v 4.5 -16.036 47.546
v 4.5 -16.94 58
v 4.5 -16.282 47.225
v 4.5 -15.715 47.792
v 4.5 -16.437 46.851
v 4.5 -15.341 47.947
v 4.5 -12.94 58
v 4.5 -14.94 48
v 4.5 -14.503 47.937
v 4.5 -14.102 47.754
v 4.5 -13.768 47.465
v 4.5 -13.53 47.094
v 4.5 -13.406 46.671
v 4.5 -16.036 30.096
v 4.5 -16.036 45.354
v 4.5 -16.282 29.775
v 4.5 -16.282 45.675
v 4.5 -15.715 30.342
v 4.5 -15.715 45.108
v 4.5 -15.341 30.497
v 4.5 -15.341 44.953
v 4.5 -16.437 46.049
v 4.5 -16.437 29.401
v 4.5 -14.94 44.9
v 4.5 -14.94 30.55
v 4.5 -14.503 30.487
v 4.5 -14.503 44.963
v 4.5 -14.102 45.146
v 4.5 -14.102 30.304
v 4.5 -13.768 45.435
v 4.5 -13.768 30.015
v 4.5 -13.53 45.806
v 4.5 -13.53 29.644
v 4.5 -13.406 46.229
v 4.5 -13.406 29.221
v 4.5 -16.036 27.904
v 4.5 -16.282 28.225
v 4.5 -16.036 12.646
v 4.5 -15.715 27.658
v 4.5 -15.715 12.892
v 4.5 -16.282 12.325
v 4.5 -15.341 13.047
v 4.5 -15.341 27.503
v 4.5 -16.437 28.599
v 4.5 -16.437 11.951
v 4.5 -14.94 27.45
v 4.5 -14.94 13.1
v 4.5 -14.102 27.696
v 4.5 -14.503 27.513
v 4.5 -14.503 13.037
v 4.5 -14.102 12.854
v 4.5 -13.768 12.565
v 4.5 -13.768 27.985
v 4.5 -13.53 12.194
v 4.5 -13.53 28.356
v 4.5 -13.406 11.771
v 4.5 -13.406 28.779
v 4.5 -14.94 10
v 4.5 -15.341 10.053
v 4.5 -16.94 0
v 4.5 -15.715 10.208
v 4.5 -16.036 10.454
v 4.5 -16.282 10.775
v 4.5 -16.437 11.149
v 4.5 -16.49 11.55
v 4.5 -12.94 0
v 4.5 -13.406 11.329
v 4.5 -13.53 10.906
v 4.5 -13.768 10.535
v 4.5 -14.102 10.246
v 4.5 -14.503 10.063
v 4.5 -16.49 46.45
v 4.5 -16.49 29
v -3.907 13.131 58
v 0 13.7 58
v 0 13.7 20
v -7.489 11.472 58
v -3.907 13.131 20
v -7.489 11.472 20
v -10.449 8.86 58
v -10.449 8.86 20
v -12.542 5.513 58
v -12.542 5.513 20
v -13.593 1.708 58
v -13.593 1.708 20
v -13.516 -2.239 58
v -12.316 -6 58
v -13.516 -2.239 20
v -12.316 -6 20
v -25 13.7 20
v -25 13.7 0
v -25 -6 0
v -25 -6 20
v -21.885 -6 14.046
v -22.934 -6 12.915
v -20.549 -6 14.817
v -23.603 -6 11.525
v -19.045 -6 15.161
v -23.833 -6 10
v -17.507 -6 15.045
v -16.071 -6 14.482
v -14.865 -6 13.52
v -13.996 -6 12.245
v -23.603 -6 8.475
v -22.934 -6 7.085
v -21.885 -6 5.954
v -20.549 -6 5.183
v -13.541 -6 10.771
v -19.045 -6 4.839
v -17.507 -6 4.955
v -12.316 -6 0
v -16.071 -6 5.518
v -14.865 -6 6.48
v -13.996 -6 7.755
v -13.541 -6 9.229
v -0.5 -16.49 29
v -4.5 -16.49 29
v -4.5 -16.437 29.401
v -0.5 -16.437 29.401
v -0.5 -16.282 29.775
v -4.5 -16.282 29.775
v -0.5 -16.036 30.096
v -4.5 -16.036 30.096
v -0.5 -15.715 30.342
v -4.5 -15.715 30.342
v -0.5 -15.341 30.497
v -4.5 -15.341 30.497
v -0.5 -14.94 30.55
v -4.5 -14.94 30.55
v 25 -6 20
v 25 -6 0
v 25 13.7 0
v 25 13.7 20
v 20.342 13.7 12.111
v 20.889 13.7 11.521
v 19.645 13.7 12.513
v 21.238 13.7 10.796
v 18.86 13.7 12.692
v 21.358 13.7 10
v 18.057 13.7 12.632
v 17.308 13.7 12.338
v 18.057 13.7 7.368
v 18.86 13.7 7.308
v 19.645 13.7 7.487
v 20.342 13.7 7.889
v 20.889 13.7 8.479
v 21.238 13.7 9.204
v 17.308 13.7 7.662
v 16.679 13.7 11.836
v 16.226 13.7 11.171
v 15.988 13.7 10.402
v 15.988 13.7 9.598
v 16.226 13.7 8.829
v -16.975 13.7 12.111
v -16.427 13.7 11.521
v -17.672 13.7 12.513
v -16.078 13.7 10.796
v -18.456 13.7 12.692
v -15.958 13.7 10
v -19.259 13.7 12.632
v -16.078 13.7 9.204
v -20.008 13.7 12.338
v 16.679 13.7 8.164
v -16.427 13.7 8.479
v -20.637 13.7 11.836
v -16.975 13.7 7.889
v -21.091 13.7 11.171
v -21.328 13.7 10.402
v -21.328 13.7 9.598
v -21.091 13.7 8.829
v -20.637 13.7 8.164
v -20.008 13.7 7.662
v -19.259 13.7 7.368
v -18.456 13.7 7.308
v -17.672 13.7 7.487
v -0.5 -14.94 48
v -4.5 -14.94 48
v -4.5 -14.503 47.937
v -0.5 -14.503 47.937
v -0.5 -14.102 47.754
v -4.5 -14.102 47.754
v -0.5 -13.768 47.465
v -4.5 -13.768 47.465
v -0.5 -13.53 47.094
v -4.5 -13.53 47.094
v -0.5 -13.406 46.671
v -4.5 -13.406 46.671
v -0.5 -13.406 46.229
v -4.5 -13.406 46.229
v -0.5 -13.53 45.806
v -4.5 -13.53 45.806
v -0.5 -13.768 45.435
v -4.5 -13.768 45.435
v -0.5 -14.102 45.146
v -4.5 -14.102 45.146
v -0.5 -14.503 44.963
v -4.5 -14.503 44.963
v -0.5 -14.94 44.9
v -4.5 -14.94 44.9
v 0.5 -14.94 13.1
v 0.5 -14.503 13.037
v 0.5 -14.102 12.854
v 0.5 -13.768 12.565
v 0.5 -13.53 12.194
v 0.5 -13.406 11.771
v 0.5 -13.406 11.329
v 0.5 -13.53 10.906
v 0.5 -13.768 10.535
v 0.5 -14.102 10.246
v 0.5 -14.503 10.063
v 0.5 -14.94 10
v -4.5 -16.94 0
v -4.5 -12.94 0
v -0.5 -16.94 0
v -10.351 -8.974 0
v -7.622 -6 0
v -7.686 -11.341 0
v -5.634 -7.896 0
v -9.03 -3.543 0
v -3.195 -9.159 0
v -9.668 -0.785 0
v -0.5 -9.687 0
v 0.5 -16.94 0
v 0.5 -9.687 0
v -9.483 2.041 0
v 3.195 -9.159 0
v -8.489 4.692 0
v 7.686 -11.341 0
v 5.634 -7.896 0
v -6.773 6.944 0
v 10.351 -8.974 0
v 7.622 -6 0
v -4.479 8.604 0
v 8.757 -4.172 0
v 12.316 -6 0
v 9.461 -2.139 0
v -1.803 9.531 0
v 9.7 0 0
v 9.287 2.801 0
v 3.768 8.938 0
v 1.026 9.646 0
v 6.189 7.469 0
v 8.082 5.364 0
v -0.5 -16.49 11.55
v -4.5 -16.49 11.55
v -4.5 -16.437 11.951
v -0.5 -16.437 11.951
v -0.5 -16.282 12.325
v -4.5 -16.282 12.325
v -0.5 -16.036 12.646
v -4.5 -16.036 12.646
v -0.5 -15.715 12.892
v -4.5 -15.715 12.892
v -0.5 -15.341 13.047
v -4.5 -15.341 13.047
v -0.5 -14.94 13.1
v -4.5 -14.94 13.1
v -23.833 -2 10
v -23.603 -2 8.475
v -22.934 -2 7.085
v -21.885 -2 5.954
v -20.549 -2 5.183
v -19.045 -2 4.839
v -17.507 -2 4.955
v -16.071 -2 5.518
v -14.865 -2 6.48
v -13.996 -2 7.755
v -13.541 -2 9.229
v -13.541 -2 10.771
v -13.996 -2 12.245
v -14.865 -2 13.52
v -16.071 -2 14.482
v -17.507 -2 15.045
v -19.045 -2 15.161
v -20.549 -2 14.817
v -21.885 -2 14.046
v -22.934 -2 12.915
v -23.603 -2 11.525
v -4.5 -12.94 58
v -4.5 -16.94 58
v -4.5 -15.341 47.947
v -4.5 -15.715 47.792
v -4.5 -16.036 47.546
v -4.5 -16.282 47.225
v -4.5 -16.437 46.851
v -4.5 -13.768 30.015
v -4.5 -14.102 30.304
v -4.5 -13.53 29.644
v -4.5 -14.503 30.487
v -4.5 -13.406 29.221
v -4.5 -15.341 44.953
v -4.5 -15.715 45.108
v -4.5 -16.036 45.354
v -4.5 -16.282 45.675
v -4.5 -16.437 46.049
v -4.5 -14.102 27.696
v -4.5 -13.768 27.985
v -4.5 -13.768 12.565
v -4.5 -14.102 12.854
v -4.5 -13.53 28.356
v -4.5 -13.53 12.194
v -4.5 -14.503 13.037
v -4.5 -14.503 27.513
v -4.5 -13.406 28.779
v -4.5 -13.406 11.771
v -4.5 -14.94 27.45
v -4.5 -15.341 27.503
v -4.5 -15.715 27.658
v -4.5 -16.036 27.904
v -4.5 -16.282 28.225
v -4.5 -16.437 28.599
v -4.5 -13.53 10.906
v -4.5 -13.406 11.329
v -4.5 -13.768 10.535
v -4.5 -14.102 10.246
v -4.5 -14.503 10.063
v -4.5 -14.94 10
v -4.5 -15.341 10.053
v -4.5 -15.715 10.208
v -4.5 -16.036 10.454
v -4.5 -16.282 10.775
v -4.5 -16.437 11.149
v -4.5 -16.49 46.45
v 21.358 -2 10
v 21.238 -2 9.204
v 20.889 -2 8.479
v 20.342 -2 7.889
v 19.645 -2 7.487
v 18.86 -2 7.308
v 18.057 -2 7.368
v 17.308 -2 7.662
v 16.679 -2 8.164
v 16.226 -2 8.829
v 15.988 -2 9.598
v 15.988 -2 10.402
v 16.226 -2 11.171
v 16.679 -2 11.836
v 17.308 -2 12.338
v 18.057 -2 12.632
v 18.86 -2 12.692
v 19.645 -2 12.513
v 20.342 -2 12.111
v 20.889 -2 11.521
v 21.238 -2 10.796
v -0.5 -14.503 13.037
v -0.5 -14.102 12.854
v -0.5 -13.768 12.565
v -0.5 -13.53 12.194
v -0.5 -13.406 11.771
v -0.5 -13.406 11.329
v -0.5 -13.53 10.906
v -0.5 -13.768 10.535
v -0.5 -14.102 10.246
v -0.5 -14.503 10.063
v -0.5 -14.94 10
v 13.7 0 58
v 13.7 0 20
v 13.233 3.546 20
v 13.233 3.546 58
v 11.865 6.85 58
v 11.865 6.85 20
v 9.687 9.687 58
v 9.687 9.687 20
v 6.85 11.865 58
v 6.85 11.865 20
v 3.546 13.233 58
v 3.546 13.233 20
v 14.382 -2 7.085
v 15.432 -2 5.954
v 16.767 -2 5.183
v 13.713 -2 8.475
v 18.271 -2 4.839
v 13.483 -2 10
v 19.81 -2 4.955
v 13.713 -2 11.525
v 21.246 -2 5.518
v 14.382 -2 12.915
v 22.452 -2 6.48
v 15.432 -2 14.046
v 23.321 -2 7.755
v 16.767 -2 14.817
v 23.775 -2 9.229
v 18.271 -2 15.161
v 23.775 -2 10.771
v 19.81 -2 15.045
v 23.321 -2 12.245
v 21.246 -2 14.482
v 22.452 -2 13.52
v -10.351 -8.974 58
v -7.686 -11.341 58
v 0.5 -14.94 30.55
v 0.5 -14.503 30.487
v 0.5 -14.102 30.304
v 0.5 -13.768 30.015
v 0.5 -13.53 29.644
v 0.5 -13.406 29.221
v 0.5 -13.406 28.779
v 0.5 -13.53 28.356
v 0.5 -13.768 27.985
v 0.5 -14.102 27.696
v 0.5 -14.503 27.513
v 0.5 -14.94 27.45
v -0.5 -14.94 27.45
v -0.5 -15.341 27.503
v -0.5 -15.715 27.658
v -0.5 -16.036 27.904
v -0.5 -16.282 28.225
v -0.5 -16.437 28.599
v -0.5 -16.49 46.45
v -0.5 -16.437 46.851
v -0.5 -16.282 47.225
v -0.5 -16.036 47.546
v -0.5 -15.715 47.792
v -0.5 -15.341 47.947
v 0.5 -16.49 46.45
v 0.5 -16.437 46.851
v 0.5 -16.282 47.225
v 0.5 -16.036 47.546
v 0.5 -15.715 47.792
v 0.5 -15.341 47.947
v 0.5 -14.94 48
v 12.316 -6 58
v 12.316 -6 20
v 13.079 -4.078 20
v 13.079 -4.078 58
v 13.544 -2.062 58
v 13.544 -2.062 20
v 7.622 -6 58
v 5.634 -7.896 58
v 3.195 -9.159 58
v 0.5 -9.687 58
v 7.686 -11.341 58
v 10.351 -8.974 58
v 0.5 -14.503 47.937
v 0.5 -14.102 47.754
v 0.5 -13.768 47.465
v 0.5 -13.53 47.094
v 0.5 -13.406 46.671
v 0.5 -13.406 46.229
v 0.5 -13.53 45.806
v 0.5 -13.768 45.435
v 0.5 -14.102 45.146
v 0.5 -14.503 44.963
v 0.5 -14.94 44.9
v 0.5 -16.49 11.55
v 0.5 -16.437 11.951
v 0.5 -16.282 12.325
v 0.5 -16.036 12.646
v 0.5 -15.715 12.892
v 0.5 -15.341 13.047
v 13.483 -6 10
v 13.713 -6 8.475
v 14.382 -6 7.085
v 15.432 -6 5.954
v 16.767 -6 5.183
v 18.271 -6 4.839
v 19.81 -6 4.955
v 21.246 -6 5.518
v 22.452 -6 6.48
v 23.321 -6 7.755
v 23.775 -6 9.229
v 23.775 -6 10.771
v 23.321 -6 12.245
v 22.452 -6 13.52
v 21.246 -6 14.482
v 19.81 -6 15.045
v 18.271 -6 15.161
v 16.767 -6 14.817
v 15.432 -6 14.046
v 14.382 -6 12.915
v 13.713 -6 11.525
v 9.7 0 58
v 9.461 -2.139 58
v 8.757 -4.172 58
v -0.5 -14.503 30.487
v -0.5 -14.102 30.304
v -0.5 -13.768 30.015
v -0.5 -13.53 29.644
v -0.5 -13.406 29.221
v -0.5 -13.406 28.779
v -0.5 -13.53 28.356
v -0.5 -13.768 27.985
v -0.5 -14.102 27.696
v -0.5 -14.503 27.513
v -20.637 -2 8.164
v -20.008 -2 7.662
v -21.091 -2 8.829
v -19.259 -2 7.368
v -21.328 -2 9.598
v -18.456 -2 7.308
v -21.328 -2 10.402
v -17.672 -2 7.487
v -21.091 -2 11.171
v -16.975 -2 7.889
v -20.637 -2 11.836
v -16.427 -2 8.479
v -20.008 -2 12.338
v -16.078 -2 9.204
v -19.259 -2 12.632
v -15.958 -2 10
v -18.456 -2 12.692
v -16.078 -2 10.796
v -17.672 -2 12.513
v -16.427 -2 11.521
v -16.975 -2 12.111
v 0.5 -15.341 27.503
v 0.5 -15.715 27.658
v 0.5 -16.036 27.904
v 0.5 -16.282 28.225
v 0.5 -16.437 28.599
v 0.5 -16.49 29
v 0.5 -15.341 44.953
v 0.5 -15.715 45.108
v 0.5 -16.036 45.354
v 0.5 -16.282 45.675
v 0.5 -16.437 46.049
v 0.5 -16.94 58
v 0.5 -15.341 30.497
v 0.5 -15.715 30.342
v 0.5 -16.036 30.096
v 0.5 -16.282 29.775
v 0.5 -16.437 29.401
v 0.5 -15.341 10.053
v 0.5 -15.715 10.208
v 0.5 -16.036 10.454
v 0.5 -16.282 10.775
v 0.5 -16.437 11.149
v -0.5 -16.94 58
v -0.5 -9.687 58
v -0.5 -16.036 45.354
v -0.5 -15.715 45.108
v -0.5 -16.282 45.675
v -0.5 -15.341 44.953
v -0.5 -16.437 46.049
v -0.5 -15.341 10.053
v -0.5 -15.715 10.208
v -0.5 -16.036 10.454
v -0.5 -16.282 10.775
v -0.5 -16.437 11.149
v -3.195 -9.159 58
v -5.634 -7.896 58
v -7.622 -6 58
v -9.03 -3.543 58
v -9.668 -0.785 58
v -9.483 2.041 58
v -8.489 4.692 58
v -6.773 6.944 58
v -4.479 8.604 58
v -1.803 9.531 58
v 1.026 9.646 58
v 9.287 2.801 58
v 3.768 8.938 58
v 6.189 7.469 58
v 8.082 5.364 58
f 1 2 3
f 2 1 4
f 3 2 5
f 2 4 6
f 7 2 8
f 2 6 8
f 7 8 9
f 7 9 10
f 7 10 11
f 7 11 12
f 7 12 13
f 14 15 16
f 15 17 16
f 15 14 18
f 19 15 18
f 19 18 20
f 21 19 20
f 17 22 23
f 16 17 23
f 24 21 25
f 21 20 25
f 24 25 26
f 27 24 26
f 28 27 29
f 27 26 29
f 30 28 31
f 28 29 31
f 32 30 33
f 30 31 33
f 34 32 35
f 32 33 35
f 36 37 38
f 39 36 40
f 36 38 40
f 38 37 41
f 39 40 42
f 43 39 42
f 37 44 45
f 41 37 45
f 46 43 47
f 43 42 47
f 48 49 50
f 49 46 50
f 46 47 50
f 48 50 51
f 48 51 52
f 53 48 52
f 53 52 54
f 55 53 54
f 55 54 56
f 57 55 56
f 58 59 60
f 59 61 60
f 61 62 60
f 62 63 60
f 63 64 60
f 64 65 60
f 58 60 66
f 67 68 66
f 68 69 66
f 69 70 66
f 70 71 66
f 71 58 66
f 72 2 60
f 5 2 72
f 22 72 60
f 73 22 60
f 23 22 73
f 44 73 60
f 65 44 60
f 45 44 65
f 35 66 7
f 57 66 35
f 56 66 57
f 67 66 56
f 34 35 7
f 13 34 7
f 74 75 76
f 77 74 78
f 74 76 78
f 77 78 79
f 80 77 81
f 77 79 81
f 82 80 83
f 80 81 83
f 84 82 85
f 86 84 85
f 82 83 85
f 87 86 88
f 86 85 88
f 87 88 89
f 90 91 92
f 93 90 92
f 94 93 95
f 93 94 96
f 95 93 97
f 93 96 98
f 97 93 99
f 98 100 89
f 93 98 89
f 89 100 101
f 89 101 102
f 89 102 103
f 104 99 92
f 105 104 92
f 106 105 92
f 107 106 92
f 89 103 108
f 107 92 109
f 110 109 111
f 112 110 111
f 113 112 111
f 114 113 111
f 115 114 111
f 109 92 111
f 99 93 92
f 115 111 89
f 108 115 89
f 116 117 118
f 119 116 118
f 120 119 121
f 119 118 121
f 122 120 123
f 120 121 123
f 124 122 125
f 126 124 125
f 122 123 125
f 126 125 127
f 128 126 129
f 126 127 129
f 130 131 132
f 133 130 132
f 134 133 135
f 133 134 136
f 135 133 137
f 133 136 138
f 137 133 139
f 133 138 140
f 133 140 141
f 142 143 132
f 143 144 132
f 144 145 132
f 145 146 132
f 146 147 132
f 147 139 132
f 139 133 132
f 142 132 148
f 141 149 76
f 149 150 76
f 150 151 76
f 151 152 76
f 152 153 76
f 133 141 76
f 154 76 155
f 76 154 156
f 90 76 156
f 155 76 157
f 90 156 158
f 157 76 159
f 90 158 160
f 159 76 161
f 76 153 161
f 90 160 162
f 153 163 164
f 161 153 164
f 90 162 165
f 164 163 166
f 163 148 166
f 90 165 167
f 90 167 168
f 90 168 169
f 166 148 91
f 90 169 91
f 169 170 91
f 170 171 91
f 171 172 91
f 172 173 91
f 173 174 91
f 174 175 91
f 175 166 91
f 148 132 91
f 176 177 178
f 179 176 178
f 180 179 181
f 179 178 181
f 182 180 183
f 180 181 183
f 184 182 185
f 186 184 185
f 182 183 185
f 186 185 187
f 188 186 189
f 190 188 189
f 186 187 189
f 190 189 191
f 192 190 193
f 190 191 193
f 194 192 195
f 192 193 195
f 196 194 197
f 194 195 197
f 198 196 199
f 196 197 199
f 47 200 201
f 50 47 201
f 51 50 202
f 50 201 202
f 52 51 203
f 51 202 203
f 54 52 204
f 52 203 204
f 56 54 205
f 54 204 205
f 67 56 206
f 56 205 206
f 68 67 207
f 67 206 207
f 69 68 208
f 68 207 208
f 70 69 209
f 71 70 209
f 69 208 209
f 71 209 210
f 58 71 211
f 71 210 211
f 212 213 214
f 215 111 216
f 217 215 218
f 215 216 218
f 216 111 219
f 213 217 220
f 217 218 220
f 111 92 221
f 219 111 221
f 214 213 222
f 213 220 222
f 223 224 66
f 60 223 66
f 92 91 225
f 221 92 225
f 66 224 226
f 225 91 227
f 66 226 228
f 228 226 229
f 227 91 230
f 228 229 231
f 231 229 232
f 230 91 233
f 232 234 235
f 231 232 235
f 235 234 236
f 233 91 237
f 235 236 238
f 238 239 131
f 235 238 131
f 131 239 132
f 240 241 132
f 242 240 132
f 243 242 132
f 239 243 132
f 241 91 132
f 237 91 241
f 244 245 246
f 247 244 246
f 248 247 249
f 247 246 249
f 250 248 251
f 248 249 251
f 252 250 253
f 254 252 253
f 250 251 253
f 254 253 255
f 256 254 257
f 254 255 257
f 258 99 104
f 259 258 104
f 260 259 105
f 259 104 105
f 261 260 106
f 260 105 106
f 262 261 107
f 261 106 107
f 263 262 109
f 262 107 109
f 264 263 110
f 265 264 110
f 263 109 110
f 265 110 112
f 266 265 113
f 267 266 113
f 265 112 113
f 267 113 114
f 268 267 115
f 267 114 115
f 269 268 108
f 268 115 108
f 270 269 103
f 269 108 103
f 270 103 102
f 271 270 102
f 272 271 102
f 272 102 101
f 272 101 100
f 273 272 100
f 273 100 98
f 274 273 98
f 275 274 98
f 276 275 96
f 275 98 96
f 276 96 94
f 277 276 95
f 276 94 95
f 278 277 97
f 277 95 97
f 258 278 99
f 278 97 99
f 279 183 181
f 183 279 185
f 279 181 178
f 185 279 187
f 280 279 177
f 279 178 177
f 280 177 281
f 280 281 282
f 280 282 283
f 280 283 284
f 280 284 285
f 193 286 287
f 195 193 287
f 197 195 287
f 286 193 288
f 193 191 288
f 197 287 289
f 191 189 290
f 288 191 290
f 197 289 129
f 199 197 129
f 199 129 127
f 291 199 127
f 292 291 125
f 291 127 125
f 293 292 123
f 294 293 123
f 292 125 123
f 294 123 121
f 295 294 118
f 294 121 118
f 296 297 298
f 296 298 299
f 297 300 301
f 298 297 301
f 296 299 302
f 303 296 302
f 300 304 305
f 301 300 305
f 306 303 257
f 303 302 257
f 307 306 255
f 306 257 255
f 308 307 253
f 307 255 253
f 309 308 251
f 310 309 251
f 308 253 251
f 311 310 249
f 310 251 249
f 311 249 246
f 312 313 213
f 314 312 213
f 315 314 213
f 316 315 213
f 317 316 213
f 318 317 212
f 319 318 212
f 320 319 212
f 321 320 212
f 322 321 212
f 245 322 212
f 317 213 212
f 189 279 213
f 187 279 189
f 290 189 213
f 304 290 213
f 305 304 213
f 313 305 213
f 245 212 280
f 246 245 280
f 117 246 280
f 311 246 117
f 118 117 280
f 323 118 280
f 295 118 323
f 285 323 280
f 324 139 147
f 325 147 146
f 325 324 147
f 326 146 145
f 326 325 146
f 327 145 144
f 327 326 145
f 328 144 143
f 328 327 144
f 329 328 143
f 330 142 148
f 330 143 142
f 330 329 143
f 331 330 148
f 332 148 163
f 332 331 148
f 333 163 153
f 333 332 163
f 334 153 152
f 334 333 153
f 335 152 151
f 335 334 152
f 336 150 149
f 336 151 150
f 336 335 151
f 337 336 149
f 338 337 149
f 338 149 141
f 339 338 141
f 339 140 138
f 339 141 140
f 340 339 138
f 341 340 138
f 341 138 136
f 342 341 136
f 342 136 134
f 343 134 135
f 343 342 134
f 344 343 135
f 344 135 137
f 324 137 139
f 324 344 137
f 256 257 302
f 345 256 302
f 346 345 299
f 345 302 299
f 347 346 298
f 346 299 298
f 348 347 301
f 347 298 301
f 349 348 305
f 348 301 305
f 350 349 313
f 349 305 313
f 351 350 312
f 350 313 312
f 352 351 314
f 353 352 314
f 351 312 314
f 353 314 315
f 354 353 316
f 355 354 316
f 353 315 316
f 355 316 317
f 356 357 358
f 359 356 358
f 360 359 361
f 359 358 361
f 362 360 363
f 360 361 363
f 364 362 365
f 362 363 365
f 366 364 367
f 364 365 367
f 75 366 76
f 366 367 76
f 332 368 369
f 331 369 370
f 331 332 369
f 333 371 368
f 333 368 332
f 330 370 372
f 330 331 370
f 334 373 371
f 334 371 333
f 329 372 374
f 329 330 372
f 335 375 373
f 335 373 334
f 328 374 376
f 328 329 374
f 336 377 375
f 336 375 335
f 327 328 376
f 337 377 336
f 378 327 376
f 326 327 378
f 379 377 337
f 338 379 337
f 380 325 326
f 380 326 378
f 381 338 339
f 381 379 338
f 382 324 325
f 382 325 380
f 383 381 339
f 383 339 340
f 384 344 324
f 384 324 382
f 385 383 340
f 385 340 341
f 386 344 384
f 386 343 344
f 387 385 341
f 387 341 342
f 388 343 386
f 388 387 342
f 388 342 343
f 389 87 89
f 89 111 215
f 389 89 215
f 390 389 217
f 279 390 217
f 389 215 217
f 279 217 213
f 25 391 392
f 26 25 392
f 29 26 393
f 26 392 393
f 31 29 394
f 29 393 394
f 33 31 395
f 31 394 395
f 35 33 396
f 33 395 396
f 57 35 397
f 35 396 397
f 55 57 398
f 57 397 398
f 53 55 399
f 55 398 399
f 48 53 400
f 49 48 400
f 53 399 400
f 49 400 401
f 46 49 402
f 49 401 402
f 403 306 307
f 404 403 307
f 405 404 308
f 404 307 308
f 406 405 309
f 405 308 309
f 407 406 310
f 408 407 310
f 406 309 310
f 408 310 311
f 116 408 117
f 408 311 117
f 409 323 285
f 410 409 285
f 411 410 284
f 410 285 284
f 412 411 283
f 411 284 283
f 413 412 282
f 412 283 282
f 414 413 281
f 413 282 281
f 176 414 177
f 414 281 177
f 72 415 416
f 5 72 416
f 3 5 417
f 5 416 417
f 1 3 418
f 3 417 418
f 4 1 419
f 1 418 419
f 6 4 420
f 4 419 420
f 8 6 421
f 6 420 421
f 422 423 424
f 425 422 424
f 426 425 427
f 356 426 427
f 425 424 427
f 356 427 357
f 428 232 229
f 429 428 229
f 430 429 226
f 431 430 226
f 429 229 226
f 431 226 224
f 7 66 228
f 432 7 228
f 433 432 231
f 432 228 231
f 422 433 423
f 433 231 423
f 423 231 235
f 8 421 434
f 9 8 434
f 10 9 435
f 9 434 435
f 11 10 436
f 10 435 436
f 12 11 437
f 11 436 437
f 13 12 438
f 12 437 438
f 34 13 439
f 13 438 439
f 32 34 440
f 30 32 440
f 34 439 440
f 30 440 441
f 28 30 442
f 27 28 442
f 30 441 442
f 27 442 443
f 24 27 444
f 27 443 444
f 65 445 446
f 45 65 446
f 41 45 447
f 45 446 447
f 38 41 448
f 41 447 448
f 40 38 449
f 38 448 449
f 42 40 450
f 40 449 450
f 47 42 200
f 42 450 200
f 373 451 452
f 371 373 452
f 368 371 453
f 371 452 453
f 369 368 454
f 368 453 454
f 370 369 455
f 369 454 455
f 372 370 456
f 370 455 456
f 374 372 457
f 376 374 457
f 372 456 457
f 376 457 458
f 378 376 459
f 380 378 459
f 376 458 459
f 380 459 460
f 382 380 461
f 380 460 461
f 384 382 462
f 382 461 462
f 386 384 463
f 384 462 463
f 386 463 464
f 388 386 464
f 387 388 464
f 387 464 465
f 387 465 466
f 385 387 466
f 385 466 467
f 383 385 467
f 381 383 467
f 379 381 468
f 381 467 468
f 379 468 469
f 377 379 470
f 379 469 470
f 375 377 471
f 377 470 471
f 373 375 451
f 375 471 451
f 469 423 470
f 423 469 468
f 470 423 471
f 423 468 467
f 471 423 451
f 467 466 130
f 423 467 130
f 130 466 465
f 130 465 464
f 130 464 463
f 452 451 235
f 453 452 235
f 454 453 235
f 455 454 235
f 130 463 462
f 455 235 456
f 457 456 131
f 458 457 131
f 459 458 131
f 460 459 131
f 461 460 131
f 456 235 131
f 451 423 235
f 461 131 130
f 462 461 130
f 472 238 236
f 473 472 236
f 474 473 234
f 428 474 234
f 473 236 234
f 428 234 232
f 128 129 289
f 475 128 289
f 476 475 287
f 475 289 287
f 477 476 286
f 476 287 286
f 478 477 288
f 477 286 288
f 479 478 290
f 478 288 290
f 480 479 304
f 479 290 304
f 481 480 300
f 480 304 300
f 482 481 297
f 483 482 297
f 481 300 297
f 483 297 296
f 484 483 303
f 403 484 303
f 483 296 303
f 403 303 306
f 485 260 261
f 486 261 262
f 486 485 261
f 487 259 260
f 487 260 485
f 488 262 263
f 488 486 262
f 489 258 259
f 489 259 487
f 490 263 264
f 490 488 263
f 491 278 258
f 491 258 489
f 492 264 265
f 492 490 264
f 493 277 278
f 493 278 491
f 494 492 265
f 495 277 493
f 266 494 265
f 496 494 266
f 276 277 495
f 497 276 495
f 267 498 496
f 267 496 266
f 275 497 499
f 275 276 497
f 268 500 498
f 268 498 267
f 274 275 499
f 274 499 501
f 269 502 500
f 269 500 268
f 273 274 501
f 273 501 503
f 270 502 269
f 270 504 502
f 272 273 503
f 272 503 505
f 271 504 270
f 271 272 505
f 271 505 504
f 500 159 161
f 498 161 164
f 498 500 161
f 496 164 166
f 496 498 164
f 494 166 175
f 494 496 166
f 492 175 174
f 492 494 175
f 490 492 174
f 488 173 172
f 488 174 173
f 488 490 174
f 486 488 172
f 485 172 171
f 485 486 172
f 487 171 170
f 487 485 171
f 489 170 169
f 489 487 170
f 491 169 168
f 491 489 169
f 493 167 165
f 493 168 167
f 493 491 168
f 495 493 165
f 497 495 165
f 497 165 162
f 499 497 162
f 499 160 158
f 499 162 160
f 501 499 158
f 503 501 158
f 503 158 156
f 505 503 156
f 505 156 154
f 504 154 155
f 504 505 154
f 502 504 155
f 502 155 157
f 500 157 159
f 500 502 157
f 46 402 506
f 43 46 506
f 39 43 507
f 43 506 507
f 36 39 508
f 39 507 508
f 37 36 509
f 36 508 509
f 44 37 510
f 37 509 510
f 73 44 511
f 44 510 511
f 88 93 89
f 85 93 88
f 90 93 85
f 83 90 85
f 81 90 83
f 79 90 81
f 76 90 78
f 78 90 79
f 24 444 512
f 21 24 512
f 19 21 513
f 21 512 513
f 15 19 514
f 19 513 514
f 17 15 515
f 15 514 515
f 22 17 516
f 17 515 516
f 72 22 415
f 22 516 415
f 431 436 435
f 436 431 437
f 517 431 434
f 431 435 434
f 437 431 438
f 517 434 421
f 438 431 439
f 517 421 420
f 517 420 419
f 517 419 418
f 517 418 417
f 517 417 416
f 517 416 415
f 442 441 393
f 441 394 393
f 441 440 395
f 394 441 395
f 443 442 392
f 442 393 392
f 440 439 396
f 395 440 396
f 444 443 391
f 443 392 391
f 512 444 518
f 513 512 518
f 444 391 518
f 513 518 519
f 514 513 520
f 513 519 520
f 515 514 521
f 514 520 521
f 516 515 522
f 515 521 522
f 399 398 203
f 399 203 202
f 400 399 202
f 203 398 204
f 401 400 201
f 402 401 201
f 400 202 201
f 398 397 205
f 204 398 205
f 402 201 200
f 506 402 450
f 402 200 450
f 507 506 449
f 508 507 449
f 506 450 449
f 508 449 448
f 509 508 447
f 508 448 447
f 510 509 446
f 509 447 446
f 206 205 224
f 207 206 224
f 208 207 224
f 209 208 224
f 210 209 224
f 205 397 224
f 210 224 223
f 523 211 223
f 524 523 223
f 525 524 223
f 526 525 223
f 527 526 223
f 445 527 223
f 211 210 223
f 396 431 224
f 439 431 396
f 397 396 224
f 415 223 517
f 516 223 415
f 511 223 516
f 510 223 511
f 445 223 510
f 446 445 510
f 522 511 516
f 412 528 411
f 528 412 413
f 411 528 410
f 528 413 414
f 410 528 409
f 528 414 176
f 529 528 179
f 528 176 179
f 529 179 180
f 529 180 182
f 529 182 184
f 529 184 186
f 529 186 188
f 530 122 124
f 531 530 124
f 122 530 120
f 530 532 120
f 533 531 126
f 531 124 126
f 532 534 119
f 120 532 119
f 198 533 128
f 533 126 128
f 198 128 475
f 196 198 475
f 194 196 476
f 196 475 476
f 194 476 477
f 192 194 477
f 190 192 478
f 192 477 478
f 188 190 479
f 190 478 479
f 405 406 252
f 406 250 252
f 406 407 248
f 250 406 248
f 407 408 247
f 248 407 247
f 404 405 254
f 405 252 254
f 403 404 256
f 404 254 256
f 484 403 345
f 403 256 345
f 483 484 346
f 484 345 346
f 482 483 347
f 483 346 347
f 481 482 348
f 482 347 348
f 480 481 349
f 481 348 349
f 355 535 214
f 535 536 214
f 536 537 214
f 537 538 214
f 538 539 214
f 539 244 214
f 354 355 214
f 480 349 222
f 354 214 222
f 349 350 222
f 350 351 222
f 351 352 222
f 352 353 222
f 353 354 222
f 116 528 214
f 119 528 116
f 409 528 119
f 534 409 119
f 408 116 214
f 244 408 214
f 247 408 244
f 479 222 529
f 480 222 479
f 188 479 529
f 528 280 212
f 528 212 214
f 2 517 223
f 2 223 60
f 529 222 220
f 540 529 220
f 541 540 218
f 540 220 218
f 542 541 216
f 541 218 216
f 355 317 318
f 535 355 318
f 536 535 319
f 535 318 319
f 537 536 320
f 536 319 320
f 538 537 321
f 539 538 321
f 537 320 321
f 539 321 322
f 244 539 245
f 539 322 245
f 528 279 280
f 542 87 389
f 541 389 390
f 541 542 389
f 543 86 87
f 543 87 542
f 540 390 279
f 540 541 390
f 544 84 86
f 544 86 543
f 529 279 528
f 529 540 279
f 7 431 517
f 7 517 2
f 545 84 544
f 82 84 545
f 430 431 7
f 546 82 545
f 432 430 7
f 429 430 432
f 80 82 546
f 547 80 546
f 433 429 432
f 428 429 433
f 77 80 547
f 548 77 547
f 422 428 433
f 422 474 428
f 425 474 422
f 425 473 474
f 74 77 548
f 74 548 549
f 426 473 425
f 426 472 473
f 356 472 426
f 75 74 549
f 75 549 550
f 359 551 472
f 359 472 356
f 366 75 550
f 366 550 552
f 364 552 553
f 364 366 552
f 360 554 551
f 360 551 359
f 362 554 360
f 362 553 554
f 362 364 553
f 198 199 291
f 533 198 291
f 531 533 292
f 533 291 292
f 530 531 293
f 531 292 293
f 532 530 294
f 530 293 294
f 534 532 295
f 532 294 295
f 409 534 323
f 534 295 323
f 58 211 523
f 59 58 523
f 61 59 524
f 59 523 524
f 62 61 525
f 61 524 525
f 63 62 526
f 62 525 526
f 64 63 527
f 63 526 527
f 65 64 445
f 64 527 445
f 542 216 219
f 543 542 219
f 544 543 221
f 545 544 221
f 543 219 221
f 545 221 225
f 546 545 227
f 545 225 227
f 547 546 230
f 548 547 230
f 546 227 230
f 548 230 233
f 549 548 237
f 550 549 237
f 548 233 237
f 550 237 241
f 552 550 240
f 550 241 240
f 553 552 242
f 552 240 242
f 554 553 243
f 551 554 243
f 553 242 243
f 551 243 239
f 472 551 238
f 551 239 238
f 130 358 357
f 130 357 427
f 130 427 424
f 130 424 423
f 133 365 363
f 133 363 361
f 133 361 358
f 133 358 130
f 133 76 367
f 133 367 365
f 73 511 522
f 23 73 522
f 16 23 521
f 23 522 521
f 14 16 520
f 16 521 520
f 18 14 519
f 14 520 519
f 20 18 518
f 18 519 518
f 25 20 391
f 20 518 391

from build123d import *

# Parameters (mm, degrees)
F1_DEPTH = 20
F0_W     = 4
F0_H     = 2.9398608957
F2_DEPTH = 58
F4_DEPTH = 4
F5_DEPTH = 20
F7_DEPTH = 9


# Not quite as in the source:
# - a feature names something its author has since deleted; it is built from what else it names


with BuildPart() as f1:
    # F0 (on Top) → F1 (new body)
    with BuildSketch(Plane.XY):
        with BuildLine():
            Line((0, 13.7), (-25, 13.7))
            Line((-25, 13.7), (-25, -6))
            Line((-25, -6), (-12.3162494291, -6))
            ThreePointArc((-12.3162494291, -6), (-11.6165829744, 7.2625753008), (0, 13.7))
        make_face()
    extrude(amount=F1_DEPTH)



with BuildPart() as f1b:
    # F0 (on Top) → F1, piece 2 (new body)
    with BuildSketch(Plane.XY):
        with BuildLine():
            Line((25, 13.7), (0, 13.7))
            ThreePointArc((0, 13.7), (9.6873629023, 9.6873629023), (13.7, 0))
            ThreePointArc((13.7, 0), (13.3495808395, -3.0787483513), (12.3162494291, -6))
            Line((12.3162494291, -6), (25, -6))
            Line((25, -6), (25, 13.7))
        make_face()
    extrude(amount=F1_DEPTH)


with BuildPart() as f1_1:
    add(f1.part)

    add(f1b.part)  # F2 merges F1b
    # F0 (on Top) → F2 (join)
    with BuildSketch(Plane.XY):
        with BuildLine():
            ThreePointArc((13.7, 0), (9.6873629023, 9.6873629023), (0, 13.7))
            ThreePointArc((0, 13.7), (-11.6165829744, 7.2625753008), (-12.3162494291, -6))
            Line((-12.3162494291, -6), (-7.6216796049, -6))
            ThreePointArc((-7.6216796049, -6), (-3.1748785672, 9.1657048875), (9.7, 0))
            ThreePointArc((9.7, 0), (9.1657048875, -3.1748785672), (7.6216796049, -6))
            Line((7.6216796049, -6), (12.3162494291, -6))
            ThreePointArc((12.3162494291, -6), (13.3495808395, -3.0787483513), (13.7, 0))
        make_face()
        with BuildLine():
            Line((-7.6216796049, -6), (-12.3162494291, -6))
            ThreePointArc((-12.3162494291, -6), (-9.0959869464, -10.244658192), (-4.5, -12.9398608957))
            ThreePointArc((-4.5, -12.9398608957), (-2.5280436601, -13.4647315329), (-0.5, -13.6908728721))
            Line((-0.5, -13.6908728721), (-0.5, -9.6871048306))
            ThreePointArc((-0.5, -9.6871048306), (-4.4597203286, -8.6139941137), (-7.6216796049, -6))
        make_face()
        with BuildLine():
            ThreePointArc((4.5, -12.9398608957), (9.0959869464, -10.244658192), (12.3162494291, -6))
            Line((12.3162494291, -6), (7.6216796049, -6))
            ThreePointArc((7.6216796049, -6), (4.4597203286, -8.6139941137), (0.5, -9.6871048306))
            Line((0.5, -9.6871048306), (0.5, -13.6908728721))
            ThreePointArc((0.5, -13.6908728721), (2.5280436601, -13.4647315329), (4.5, -12.9398608957))
        make_face()
        with Locations((2.5, -15.4699304478)):
            Rectangle(F0_W, F0_H)
        with BuildLine():
            Line((4.5, -14), (4.5, -12.9398608957))
            ThreePointArc((4.5, -12.9398608957), (2.5280436601, -13.4647315329), (0.5, -13.6908728721))
            Line((0.5, -13.6908728721), (0.5, -14))
            Line((0.5, -14), (4.5, -14))
        make_face()
        with BuildLine():
            ThreePointArc((-0.5, -13.6908728721), (-2.5280436601, -13.4647315329), (-4.5, -12.9398608957))
            Line((-4.5, -12.9398608957), (-4.5, -14))
            Line((-4.5, -14), (-0.5, -14))
            Line((-0.5, -14), (-0.5, -13.6908728721))
        make_face()
        with Locations((-2.5, -15.4699304478)):
            Rectangle(F0_W, F0_H)
    extrude(amount=F2_DEPTH)

    # F3 (on face) → F4 (cut)
    with BuildSketch(Plane.XZ.offset(6)):
        with BuildLine():
            ThreePointArc((-21.3581247146, 10), (-18.6581247146, 12.7), (-15.9581247146, 10))
            Line((-15.9581247146, 10), (-13.4831247146, 10))
            ThreePointArc((-13.4831247146, 10), (-18.6581247146, 15.175), (-23.8331247146, 10))
            Line((-23.8331247146, 10), (-21.3581247146, 10))
        make_face()
        with BuildLine():
            Line((-13.4831247146, 10), (-15.9581247146, 10))
            ThreePointArc((-15.9581247146, 10), (-18.6581247146, 7.3), (-21.3581247146, 10))
            Line((-21.3581247146, 10), (-23.8331247146, 10))
            ThreePointArc((-23.8331247146, 10), (-18.6581247146, 4.825), (-13.4831247146, 10))
        make_face()
        with BuildLine():
            ThreePointArc((23.8331247146, 10), (18.6581247146, 15.175), (13.4831247146, 10))
            Line((13.4831247146, 10), (15.9581247146, 10))
            ThreePointArc((15.9581247146, 10), (18.6581247146, 12.7), (21.3581247146, 10))
            Line((21.3581247146, 10), (23.8331247146, 10))
        make_face()
        with BuildLine():
            Line((15.9581247146, 10), (13.4831247146, 10))
            ThreePointArc((13.4831247146, 10), (18.6581247146, 4.825), (23.8331247146, 10))
            Line((23.8331247146, 10), (21.3581247146, 10))
            ThreePointArc((21.3581247146, 10), (18.6581247146, 7.3), (15.9581247146, 10))
        make_face()
    extrude(amount=-F4_DEPTH, mode=Mode.SUBTRACT)

    # F5 (cut): faces of the model
    f5_faces = [f1_1.faces().sort_by_distance(p)[0] for p in [
        (-18.6581247146, -6, 10),
        (18.6581247146, -6, 10),
    ]]
    extrude(f5_faces, amount=-F5_DEPTH, mode=Mode.SUBTRACT)

    # F6 (on face) → F7 (cut)
    with BuildSketch(Plane(origin=(-4.5, 0, 0), x_dir=(0, -1, 0), z_dir=(-1, 0, 0))):
        with BuildLine():
            ThreePointArc((16.4898608957, 46.45), (16.0358764065, 47.5460155108), (14.9398608957, 48))
            Line((14.9398608957, 48), (14.9398608957, 44.9))
            ThreePointArc((14.9398608957, 44.9), (16.0358764065, 45.3539844892), (16.4898608957, 46.45))
        make_face()
        with BuildLine():
            ThreePointArc((16.4898608957, 11.55), (16.0358764065, 12.6460155108), (14.9398608957, 13.1))
            Line((14.9398608957, 13.1), (14.9398608957, 10))
            ThreePointArc((14.9398608957, 10), (16.0358764065, 10.4539844892), (16.4898608957, 11.55))
        make_face()
        with BuildLine():
            Line((14.9398608957, 10), (14.9398608957, 13.1))
            ThreePointArc((14.9398608957, 13.1), (13.3898608957, 11.55), (14.9398608957, 10))
        make_face()
        with BuildLine():
            ThreePointArc((16.4898608957, 29), (16.0358764065, 30.0960155108), (14.9398608957, 30.55))
            Line((14.9398608957, 30.55), (14.9398608957, 29))
            Line((14.9398608957, 29), (16.4898608957, 29))
        make_face()
        with BuildLine():
            Line((14.9398608957, 29), (14.9398608957, 30.55))
            ThreePointArc((14.9398608957, 30.55), (13.3898608957, 29), (14.9398608957, 27.45))
            Line((14.9398608957, 27.45), (14.9398608957, 29))
        make_face()
        with BuildLine():
            Line((14.9398608957, 44.9), (14.9398608957, 48))
            ThreePointArc((14.9398608957, 48), (13.3898608957, 46.45), (14.9398608957, 44.9))
        make_face()
        with BuildLine():
            Line((16.4898608957, 29), (14.9398608957, 29))
            Line((14.9398608957, 29), (14.9398608957, 27.45))
            ThreePointArc((14.9398608957, 27.45), (16.0358764065, 27.9039844892), (16.4898608957, 29))
        make_face()
    extrude(amount=-F7_DEPTH, mode=Mode.SUBTRACT)


solid = f1_1.part
